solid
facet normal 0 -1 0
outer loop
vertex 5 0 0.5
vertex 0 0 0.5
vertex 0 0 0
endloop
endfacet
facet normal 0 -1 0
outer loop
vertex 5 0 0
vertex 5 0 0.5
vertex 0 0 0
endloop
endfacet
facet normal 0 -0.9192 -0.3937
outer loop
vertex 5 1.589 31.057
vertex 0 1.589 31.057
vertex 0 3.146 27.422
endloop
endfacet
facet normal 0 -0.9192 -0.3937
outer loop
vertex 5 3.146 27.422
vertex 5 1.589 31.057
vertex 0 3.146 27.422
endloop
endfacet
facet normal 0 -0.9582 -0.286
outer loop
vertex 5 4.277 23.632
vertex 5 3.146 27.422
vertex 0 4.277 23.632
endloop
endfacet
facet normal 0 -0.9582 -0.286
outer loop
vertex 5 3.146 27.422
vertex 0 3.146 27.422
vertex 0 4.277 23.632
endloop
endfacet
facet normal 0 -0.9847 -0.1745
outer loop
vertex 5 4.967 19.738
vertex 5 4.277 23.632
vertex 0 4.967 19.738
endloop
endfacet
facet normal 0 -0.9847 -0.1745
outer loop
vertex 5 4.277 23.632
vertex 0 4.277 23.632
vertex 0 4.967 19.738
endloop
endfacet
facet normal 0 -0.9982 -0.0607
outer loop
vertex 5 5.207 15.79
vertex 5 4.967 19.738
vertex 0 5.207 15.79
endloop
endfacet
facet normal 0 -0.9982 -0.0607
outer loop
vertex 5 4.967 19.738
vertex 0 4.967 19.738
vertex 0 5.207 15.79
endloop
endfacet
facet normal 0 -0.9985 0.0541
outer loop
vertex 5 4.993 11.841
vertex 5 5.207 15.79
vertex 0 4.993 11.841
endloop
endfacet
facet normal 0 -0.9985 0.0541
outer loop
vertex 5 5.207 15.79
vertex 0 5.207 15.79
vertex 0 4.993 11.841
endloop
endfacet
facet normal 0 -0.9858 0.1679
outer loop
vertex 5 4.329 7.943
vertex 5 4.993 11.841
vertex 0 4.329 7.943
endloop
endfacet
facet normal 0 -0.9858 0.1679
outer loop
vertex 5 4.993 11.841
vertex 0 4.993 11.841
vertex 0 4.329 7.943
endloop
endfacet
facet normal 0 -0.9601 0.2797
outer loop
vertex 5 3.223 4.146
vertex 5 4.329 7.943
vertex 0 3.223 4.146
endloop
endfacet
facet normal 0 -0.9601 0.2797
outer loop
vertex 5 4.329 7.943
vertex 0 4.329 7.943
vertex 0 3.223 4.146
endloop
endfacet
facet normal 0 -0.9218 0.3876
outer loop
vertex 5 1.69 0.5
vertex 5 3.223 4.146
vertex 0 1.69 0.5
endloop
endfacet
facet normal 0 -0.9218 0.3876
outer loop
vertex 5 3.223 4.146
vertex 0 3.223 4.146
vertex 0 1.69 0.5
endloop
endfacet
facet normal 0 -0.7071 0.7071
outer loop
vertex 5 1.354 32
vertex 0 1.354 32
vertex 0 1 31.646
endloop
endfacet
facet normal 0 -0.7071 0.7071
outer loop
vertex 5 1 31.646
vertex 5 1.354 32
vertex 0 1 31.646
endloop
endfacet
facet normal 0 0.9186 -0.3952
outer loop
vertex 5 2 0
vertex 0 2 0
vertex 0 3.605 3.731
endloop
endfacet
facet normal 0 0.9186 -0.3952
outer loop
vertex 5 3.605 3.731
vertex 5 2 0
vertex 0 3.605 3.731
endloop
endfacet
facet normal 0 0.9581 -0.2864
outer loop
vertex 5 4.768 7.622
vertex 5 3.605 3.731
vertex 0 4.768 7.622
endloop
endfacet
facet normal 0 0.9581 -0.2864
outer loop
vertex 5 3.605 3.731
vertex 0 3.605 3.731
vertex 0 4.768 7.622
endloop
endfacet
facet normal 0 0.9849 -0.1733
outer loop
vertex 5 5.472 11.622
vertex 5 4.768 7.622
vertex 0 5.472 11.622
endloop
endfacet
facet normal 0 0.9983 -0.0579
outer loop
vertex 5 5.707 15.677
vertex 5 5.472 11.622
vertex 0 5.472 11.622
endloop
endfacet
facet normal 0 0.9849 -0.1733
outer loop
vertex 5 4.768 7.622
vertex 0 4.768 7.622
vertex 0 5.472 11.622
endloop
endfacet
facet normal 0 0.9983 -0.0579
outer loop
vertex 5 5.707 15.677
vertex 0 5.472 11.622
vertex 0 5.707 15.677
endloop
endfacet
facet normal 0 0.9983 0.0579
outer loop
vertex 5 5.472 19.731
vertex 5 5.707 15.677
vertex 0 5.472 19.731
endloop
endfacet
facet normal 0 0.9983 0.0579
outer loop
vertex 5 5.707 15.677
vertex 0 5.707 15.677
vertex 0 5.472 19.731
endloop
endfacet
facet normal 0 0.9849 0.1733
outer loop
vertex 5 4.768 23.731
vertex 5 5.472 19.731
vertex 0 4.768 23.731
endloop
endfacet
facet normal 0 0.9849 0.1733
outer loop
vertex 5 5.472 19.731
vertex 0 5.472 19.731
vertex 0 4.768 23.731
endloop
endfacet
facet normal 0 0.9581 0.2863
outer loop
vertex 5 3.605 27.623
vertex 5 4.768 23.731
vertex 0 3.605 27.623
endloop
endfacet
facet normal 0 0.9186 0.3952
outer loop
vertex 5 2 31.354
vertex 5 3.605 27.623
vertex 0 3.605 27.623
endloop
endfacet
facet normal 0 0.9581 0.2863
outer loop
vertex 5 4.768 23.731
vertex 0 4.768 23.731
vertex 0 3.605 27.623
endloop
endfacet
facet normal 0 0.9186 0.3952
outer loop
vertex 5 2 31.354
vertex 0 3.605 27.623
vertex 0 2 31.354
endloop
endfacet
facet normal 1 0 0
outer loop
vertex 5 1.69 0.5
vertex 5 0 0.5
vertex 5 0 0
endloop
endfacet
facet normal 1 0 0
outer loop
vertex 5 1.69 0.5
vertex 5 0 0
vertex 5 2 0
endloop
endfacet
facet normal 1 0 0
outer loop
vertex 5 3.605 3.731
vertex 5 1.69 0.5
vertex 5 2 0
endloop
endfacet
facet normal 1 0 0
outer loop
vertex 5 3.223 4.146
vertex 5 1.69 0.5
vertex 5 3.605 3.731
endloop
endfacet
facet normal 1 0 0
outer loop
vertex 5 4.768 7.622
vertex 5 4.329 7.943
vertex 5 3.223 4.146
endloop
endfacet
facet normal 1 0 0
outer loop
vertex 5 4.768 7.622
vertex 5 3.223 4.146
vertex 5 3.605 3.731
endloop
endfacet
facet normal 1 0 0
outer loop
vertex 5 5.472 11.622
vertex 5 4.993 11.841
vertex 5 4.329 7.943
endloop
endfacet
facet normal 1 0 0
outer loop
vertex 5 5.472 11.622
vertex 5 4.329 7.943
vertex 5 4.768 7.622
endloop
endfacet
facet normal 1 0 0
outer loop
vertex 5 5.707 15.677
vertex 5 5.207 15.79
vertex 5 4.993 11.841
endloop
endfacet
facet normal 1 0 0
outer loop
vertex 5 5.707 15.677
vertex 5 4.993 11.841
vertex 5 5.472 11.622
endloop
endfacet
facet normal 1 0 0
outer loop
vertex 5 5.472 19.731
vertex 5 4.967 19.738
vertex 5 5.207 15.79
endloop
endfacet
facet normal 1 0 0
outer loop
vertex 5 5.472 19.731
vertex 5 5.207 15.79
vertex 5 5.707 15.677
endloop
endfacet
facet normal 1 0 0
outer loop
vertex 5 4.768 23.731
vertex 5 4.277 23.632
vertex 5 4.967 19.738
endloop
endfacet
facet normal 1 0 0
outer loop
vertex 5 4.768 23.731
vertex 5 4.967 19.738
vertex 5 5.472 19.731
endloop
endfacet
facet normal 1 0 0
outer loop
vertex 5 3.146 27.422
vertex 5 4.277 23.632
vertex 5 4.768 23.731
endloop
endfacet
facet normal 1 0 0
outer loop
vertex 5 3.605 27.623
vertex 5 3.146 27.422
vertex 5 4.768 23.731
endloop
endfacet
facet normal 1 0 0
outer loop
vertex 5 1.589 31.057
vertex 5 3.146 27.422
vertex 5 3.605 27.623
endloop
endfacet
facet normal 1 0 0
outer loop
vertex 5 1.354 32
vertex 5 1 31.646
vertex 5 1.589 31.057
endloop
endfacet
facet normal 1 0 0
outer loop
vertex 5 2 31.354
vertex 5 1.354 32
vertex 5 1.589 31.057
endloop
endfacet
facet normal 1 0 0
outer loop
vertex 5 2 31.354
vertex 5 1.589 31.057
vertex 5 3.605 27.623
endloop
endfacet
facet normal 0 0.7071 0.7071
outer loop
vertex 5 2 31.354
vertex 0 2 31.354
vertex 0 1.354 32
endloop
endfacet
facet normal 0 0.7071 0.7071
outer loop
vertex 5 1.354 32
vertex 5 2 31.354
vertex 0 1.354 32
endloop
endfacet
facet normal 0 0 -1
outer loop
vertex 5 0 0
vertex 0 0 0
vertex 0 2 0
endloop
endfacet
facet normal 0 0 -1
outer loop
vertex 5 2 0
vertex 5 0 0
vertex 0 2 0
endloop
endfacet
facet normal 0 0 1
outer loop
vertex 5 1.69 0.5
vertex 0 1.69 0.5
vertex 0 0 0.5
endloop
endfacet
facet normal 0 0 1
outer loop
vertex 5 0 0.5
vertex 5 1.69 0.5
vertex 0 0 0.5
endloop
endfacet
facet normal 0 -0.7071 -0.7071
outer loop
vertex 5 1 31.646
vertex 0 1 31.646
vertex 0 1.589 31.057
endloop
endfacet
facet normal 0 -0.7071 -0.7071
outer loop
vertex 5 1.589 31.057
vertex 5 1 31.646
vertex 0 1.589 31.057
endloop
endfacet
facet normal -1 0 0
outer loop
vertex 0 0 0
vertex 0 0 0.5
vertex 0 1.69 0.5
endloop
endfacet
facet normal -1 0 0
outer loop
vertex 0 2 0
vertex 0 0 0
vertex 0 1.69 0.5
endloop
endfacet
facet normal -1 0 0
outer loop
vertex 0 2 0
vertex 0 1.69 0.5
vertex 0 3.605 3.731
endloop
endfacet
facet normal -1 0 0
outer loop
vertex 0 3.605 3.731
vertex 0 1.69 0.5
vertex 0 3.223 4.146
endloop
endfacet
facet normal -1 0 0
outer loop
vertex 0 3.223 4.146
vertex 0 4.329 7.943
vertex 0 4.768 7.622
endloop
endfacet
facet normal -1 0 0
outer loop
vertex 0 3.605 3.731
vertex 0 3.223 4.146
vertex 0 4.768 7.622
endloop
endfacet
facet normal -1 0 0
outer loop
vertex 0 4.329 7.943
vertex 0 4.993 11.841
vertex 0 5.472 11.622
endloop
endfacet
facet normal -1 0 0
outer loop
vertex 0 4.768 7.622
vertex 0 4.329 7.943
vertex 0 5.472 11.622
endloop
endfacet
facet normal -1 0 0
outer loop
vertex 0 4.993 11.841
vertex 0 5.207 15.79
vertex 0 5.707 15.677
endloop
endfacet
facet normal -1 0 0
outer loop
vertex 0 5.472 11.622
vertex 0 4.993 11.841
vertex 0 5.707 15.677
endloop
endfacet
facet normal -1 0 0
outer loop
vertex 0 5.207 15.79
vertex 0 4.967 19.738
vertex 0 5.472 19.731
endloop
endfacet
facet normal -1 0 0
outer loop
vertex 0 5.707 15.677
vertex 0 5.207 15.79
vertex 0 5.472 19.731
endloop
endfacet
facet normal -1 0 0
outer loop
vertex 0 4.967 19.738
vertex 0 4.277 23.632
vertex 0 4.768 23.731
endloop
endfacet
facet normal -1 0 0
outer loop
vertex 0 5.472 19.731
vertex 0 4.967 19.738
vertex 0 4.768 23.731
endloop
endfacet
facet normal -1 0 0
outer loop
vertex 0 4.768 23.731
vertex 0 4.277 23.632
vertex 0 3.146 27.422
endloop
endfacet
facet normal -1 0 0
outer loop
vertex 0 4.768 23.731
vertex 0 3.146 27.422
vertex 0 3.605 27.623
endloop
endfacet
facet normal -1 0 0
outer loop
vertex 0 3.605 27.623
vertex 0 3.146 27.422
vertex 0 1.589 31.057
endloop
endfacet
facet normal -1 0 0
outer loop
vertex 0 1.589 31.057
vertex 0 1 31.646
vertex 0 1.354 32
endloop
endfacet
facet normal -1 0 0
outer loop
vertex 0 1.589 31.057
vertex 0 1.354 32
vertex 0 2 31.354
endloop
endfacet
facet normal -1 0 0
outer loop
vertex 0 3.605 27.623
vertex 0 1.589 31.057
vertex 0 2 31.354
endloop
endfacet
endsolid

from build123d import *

# Parameters (mm, degrees)
F1_DEPTH = 5


with BuildPart() as f1:
    # F0 (on Right) → F1 (new body)
    with BuildSketch(Plane.YZ):
        with BuildLine():
            Line((0, 0.5), (0, 0))
            Line((0, 0), (2, 0))
            ThreePointArc((2, 0), (5.707211, 15.676777), (2, 31.353553))
            Line((2, 31.353553), (1.353553, 32))
            Line((1.353553, 32), (1, 31.646447))
            Line((1, 31.646447), (1.589002, 31.057444))
            ThreePointArc((1.589002, 31.057444), (5.207023, 15.79048), (1.689713, 0.5))
            Line((1.689713, 0.5), (0, 0.5))
        make_face()
    extrude(amount=F1_DEPTH)


solid = f1.part
